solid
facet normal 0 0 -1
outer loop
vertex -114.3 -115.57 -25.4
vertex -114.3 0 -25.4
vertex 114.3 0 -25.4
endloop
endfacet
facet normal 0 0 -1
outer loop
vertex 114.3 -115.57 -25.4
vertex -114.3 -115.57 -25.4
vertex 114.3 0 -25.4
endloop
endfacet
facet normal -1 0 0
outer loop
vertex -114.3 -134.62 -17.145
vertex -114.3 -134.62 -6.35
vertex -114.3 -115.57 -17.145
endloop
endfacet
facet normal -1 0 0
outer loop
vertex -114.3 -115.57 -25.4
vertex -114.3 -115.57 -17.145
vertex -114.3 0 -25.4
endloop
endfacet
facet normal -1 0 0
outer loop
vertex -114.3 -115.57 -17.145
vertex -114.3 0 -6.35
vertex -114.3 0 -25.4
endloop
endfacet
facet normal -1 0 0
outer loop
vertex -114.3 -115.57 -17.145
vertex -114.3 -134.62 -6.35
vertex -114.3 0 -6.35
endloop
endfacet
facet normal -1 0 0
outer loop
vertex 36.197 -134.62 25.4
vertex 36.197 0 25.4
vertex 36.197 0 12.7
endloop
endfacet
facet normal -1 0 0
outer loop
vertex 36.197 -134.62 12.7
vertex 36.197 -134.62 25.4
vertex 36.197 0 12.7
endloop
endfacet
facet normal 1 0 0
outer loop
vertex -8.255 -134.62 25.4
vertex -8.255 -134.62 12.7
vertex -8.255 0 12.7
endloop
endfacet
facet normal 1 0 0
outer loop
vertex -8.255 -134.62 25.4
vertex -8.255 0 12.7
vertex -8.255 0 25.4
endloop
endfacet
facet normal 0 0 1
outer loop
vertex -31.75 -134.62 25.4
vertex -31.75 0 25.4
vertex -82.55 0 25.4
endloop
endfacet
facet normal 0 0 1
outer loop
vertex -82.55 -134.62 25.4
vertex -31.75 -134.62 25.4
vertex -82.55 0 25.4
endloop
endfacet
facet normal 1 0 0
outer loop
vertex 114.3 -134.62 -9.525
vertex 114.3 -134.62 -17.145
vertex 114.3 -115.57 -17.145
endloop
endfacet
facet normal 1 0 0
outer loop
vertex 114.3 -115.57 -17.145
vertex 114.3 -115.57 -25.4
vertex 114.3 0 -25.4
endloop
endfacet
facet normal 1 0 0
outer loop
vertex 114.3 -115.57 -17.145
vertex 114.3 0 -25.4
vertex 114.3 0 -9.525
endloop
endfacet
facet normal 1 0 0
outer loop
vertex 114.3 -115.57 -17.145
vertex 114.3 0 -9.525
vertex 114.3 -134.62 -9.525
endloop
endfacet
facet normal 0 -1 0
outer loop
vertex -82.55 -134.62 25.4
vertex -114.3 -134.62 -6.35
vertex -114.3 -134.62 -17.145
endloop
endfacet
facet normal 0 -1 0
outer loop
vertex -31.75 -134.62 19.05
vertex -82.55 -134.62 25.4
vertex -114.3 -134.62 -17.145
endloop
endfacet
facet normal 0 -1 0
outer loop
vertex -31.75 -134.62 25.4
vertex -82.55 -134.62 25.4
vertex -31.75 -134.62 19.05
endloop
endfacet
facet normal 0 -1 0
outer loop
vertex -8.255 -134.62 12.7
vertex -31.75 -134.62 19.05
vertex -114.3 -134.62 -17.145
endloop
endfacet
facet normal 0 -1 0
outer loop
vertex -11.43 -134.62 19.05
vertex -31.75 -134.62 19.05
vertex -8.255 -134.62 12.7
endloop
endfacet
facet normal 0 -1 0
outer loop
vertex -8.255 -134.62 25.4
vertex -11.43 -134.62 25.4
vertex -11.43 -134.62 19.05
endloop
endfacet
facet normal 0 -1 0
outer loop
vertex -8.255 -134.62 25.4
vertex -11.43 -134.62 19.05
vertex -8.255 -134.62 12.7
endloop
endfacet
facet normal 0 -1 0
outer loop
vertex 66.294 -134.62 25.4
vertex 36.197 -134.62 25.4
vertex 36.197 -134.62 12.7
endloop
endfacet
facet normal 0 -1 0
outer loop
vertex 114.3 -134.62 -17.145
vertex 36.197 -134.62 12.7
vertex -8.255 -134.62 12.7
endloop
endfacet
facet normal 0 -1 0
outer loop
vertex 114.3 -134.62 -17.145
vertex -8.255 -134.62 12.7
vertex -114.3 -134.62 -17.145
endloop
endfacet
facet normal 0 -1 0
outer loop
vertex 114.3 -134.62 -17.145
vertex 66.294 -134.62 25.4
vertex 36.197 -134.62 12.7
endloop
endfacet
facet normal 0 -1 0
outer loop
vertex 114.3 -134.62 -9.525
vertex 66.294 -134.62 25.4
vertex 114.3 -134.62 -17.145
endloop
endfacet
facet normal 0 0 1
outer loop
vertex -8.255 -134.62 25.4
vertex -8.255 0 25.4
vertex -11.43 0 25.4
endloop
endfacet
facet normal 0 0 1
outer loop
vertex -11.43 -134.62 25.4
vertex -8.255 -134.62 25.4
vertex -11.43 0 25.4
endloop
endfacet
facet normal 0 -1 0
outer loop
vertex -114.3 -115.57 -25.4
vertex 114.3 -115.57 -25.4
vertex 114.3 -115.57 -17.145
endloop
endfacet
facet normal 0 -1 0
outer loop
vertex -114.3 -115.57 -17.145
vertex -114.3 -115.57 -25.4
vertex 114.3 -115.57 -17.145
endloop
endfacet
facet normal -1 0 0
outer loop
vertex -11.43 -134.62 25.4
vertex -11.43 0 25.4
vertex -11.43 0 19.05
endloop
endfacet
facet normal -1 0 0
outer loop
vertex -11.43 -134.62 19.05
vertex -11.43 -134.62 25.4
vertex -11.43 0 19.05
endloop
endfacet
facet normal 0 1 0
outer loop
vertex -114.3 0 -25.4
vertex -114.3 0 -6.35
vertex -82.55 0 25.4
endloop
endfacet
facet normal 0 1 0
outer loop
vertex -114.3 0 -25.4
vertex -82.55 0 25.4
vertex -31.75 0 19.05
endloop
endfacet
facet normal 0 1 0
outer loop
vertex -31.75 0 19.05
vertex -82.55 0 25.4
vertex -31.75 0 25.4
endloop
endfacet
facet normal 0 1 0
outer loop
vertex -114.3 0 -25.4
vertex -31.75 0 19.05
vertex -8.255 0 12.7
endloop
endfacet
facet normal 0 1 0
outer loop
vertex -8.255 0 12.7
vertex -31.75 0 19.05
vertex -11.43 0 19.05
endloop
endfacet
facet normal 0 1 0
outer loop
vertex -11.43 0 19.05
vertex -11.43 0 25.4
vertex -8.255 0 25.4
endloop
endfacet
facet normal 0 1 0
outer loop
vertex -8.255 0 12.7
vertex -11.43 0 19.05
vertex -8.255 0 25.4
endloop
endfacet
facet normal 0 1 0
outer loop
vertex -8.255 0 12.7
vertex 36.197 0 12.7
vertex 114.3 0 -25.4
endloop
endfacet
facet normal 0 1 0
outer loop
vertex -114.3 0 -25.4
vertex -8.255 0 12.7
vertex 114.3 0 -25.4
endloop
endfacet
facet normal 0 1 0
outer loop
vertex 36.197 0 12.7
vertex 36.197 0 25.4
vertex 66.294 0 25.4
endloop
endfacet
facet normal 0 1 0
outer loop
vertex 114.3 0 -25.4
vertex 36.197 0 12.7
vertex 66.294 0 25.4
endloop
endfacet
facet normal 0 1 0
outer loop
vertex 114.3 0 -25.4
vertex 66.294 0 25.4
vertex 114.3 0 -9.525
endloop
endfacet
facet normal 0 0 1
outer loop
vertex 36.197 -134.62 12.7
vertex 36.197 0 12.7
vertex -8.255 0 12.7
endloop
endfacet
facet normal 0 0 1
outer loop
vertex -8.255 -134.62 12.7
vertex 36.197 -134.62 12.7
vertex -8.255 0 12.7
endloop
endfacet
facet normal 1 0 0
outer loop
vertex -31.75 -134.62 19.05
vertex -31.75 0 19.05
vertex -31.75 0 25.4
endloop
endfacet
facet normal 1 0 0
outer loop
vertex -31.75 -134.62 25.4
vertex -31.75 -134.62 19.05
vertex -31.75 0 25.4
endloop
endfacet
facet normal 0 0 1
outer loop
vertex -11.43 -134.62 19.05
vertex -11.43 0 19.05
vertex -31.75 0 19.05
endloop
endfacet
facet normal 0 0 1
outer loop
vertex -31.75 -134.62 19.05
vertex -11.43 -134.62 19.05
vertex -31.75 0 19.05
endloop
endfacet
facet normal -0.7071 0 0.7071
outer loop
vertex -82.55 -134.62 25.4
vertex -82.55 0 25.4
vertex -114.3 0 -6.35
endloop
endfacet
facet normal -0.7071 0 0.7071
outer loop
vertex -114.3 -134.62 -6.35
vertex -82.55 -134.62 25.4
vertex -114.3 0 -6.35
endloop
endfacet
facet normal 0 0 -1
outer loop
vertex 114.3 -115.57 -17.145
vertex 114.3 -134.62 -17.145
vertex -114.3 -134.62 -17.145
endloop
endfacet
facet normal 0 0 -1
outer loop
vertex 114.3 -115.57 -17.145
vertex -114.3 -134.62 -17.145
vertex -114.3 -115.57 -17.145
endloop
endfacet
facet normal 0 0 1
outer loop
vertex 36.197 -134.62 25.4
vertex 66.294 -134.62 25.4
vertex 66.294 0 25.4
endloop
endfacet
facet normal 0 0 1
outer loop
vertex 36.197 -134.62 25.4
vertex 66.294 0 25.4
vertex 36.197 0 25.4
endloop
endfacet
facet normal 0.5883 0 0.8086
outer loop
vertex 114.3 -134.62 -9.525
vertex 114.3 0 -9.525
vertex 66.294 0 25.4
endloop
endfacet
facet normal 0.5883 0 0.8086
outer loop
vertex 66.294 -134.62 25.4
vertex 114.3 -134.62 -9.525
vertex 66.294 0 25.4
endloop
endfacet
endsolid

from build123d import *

# Parameters (mm, degrees)
F1_DEPTH = 134.62
F2_W     = 19.05
F2_H     = 8.255
F3_DEPTH = 228.6


with BuildPart() as f1:
    # F0 (on Front) → F1 (new body)
    with BuildSketch(Plane.XZ):
        Polygon((-114.3, -25.4), (114.3, -25.4), (114.3, -9.525), (66.294, 25.4), (36.197161, 25.4), (36.197161, 12.7), (-8.255, 12.7), (-8.255, 25.4), (-11.43, 25.4), (-11.43, 19.05), (-31.75, 19.05), (-31.75, 25.4), (-82.55, 25.4), (-114.3, -6.35), align=None)
    extrude(amount=F1_DEPTH)

    # F2 (on face) → F3 (cut)
    with BuildSketch(Plane.YZ.offset(114.3)):
        with Locations((-125.095, -21.2725)):
            Rectangle(F2_W, F2_H)
    extrude(amount=-F3_DEPTH, mode=Mode.SUBTRACT)


solid = f1.part
